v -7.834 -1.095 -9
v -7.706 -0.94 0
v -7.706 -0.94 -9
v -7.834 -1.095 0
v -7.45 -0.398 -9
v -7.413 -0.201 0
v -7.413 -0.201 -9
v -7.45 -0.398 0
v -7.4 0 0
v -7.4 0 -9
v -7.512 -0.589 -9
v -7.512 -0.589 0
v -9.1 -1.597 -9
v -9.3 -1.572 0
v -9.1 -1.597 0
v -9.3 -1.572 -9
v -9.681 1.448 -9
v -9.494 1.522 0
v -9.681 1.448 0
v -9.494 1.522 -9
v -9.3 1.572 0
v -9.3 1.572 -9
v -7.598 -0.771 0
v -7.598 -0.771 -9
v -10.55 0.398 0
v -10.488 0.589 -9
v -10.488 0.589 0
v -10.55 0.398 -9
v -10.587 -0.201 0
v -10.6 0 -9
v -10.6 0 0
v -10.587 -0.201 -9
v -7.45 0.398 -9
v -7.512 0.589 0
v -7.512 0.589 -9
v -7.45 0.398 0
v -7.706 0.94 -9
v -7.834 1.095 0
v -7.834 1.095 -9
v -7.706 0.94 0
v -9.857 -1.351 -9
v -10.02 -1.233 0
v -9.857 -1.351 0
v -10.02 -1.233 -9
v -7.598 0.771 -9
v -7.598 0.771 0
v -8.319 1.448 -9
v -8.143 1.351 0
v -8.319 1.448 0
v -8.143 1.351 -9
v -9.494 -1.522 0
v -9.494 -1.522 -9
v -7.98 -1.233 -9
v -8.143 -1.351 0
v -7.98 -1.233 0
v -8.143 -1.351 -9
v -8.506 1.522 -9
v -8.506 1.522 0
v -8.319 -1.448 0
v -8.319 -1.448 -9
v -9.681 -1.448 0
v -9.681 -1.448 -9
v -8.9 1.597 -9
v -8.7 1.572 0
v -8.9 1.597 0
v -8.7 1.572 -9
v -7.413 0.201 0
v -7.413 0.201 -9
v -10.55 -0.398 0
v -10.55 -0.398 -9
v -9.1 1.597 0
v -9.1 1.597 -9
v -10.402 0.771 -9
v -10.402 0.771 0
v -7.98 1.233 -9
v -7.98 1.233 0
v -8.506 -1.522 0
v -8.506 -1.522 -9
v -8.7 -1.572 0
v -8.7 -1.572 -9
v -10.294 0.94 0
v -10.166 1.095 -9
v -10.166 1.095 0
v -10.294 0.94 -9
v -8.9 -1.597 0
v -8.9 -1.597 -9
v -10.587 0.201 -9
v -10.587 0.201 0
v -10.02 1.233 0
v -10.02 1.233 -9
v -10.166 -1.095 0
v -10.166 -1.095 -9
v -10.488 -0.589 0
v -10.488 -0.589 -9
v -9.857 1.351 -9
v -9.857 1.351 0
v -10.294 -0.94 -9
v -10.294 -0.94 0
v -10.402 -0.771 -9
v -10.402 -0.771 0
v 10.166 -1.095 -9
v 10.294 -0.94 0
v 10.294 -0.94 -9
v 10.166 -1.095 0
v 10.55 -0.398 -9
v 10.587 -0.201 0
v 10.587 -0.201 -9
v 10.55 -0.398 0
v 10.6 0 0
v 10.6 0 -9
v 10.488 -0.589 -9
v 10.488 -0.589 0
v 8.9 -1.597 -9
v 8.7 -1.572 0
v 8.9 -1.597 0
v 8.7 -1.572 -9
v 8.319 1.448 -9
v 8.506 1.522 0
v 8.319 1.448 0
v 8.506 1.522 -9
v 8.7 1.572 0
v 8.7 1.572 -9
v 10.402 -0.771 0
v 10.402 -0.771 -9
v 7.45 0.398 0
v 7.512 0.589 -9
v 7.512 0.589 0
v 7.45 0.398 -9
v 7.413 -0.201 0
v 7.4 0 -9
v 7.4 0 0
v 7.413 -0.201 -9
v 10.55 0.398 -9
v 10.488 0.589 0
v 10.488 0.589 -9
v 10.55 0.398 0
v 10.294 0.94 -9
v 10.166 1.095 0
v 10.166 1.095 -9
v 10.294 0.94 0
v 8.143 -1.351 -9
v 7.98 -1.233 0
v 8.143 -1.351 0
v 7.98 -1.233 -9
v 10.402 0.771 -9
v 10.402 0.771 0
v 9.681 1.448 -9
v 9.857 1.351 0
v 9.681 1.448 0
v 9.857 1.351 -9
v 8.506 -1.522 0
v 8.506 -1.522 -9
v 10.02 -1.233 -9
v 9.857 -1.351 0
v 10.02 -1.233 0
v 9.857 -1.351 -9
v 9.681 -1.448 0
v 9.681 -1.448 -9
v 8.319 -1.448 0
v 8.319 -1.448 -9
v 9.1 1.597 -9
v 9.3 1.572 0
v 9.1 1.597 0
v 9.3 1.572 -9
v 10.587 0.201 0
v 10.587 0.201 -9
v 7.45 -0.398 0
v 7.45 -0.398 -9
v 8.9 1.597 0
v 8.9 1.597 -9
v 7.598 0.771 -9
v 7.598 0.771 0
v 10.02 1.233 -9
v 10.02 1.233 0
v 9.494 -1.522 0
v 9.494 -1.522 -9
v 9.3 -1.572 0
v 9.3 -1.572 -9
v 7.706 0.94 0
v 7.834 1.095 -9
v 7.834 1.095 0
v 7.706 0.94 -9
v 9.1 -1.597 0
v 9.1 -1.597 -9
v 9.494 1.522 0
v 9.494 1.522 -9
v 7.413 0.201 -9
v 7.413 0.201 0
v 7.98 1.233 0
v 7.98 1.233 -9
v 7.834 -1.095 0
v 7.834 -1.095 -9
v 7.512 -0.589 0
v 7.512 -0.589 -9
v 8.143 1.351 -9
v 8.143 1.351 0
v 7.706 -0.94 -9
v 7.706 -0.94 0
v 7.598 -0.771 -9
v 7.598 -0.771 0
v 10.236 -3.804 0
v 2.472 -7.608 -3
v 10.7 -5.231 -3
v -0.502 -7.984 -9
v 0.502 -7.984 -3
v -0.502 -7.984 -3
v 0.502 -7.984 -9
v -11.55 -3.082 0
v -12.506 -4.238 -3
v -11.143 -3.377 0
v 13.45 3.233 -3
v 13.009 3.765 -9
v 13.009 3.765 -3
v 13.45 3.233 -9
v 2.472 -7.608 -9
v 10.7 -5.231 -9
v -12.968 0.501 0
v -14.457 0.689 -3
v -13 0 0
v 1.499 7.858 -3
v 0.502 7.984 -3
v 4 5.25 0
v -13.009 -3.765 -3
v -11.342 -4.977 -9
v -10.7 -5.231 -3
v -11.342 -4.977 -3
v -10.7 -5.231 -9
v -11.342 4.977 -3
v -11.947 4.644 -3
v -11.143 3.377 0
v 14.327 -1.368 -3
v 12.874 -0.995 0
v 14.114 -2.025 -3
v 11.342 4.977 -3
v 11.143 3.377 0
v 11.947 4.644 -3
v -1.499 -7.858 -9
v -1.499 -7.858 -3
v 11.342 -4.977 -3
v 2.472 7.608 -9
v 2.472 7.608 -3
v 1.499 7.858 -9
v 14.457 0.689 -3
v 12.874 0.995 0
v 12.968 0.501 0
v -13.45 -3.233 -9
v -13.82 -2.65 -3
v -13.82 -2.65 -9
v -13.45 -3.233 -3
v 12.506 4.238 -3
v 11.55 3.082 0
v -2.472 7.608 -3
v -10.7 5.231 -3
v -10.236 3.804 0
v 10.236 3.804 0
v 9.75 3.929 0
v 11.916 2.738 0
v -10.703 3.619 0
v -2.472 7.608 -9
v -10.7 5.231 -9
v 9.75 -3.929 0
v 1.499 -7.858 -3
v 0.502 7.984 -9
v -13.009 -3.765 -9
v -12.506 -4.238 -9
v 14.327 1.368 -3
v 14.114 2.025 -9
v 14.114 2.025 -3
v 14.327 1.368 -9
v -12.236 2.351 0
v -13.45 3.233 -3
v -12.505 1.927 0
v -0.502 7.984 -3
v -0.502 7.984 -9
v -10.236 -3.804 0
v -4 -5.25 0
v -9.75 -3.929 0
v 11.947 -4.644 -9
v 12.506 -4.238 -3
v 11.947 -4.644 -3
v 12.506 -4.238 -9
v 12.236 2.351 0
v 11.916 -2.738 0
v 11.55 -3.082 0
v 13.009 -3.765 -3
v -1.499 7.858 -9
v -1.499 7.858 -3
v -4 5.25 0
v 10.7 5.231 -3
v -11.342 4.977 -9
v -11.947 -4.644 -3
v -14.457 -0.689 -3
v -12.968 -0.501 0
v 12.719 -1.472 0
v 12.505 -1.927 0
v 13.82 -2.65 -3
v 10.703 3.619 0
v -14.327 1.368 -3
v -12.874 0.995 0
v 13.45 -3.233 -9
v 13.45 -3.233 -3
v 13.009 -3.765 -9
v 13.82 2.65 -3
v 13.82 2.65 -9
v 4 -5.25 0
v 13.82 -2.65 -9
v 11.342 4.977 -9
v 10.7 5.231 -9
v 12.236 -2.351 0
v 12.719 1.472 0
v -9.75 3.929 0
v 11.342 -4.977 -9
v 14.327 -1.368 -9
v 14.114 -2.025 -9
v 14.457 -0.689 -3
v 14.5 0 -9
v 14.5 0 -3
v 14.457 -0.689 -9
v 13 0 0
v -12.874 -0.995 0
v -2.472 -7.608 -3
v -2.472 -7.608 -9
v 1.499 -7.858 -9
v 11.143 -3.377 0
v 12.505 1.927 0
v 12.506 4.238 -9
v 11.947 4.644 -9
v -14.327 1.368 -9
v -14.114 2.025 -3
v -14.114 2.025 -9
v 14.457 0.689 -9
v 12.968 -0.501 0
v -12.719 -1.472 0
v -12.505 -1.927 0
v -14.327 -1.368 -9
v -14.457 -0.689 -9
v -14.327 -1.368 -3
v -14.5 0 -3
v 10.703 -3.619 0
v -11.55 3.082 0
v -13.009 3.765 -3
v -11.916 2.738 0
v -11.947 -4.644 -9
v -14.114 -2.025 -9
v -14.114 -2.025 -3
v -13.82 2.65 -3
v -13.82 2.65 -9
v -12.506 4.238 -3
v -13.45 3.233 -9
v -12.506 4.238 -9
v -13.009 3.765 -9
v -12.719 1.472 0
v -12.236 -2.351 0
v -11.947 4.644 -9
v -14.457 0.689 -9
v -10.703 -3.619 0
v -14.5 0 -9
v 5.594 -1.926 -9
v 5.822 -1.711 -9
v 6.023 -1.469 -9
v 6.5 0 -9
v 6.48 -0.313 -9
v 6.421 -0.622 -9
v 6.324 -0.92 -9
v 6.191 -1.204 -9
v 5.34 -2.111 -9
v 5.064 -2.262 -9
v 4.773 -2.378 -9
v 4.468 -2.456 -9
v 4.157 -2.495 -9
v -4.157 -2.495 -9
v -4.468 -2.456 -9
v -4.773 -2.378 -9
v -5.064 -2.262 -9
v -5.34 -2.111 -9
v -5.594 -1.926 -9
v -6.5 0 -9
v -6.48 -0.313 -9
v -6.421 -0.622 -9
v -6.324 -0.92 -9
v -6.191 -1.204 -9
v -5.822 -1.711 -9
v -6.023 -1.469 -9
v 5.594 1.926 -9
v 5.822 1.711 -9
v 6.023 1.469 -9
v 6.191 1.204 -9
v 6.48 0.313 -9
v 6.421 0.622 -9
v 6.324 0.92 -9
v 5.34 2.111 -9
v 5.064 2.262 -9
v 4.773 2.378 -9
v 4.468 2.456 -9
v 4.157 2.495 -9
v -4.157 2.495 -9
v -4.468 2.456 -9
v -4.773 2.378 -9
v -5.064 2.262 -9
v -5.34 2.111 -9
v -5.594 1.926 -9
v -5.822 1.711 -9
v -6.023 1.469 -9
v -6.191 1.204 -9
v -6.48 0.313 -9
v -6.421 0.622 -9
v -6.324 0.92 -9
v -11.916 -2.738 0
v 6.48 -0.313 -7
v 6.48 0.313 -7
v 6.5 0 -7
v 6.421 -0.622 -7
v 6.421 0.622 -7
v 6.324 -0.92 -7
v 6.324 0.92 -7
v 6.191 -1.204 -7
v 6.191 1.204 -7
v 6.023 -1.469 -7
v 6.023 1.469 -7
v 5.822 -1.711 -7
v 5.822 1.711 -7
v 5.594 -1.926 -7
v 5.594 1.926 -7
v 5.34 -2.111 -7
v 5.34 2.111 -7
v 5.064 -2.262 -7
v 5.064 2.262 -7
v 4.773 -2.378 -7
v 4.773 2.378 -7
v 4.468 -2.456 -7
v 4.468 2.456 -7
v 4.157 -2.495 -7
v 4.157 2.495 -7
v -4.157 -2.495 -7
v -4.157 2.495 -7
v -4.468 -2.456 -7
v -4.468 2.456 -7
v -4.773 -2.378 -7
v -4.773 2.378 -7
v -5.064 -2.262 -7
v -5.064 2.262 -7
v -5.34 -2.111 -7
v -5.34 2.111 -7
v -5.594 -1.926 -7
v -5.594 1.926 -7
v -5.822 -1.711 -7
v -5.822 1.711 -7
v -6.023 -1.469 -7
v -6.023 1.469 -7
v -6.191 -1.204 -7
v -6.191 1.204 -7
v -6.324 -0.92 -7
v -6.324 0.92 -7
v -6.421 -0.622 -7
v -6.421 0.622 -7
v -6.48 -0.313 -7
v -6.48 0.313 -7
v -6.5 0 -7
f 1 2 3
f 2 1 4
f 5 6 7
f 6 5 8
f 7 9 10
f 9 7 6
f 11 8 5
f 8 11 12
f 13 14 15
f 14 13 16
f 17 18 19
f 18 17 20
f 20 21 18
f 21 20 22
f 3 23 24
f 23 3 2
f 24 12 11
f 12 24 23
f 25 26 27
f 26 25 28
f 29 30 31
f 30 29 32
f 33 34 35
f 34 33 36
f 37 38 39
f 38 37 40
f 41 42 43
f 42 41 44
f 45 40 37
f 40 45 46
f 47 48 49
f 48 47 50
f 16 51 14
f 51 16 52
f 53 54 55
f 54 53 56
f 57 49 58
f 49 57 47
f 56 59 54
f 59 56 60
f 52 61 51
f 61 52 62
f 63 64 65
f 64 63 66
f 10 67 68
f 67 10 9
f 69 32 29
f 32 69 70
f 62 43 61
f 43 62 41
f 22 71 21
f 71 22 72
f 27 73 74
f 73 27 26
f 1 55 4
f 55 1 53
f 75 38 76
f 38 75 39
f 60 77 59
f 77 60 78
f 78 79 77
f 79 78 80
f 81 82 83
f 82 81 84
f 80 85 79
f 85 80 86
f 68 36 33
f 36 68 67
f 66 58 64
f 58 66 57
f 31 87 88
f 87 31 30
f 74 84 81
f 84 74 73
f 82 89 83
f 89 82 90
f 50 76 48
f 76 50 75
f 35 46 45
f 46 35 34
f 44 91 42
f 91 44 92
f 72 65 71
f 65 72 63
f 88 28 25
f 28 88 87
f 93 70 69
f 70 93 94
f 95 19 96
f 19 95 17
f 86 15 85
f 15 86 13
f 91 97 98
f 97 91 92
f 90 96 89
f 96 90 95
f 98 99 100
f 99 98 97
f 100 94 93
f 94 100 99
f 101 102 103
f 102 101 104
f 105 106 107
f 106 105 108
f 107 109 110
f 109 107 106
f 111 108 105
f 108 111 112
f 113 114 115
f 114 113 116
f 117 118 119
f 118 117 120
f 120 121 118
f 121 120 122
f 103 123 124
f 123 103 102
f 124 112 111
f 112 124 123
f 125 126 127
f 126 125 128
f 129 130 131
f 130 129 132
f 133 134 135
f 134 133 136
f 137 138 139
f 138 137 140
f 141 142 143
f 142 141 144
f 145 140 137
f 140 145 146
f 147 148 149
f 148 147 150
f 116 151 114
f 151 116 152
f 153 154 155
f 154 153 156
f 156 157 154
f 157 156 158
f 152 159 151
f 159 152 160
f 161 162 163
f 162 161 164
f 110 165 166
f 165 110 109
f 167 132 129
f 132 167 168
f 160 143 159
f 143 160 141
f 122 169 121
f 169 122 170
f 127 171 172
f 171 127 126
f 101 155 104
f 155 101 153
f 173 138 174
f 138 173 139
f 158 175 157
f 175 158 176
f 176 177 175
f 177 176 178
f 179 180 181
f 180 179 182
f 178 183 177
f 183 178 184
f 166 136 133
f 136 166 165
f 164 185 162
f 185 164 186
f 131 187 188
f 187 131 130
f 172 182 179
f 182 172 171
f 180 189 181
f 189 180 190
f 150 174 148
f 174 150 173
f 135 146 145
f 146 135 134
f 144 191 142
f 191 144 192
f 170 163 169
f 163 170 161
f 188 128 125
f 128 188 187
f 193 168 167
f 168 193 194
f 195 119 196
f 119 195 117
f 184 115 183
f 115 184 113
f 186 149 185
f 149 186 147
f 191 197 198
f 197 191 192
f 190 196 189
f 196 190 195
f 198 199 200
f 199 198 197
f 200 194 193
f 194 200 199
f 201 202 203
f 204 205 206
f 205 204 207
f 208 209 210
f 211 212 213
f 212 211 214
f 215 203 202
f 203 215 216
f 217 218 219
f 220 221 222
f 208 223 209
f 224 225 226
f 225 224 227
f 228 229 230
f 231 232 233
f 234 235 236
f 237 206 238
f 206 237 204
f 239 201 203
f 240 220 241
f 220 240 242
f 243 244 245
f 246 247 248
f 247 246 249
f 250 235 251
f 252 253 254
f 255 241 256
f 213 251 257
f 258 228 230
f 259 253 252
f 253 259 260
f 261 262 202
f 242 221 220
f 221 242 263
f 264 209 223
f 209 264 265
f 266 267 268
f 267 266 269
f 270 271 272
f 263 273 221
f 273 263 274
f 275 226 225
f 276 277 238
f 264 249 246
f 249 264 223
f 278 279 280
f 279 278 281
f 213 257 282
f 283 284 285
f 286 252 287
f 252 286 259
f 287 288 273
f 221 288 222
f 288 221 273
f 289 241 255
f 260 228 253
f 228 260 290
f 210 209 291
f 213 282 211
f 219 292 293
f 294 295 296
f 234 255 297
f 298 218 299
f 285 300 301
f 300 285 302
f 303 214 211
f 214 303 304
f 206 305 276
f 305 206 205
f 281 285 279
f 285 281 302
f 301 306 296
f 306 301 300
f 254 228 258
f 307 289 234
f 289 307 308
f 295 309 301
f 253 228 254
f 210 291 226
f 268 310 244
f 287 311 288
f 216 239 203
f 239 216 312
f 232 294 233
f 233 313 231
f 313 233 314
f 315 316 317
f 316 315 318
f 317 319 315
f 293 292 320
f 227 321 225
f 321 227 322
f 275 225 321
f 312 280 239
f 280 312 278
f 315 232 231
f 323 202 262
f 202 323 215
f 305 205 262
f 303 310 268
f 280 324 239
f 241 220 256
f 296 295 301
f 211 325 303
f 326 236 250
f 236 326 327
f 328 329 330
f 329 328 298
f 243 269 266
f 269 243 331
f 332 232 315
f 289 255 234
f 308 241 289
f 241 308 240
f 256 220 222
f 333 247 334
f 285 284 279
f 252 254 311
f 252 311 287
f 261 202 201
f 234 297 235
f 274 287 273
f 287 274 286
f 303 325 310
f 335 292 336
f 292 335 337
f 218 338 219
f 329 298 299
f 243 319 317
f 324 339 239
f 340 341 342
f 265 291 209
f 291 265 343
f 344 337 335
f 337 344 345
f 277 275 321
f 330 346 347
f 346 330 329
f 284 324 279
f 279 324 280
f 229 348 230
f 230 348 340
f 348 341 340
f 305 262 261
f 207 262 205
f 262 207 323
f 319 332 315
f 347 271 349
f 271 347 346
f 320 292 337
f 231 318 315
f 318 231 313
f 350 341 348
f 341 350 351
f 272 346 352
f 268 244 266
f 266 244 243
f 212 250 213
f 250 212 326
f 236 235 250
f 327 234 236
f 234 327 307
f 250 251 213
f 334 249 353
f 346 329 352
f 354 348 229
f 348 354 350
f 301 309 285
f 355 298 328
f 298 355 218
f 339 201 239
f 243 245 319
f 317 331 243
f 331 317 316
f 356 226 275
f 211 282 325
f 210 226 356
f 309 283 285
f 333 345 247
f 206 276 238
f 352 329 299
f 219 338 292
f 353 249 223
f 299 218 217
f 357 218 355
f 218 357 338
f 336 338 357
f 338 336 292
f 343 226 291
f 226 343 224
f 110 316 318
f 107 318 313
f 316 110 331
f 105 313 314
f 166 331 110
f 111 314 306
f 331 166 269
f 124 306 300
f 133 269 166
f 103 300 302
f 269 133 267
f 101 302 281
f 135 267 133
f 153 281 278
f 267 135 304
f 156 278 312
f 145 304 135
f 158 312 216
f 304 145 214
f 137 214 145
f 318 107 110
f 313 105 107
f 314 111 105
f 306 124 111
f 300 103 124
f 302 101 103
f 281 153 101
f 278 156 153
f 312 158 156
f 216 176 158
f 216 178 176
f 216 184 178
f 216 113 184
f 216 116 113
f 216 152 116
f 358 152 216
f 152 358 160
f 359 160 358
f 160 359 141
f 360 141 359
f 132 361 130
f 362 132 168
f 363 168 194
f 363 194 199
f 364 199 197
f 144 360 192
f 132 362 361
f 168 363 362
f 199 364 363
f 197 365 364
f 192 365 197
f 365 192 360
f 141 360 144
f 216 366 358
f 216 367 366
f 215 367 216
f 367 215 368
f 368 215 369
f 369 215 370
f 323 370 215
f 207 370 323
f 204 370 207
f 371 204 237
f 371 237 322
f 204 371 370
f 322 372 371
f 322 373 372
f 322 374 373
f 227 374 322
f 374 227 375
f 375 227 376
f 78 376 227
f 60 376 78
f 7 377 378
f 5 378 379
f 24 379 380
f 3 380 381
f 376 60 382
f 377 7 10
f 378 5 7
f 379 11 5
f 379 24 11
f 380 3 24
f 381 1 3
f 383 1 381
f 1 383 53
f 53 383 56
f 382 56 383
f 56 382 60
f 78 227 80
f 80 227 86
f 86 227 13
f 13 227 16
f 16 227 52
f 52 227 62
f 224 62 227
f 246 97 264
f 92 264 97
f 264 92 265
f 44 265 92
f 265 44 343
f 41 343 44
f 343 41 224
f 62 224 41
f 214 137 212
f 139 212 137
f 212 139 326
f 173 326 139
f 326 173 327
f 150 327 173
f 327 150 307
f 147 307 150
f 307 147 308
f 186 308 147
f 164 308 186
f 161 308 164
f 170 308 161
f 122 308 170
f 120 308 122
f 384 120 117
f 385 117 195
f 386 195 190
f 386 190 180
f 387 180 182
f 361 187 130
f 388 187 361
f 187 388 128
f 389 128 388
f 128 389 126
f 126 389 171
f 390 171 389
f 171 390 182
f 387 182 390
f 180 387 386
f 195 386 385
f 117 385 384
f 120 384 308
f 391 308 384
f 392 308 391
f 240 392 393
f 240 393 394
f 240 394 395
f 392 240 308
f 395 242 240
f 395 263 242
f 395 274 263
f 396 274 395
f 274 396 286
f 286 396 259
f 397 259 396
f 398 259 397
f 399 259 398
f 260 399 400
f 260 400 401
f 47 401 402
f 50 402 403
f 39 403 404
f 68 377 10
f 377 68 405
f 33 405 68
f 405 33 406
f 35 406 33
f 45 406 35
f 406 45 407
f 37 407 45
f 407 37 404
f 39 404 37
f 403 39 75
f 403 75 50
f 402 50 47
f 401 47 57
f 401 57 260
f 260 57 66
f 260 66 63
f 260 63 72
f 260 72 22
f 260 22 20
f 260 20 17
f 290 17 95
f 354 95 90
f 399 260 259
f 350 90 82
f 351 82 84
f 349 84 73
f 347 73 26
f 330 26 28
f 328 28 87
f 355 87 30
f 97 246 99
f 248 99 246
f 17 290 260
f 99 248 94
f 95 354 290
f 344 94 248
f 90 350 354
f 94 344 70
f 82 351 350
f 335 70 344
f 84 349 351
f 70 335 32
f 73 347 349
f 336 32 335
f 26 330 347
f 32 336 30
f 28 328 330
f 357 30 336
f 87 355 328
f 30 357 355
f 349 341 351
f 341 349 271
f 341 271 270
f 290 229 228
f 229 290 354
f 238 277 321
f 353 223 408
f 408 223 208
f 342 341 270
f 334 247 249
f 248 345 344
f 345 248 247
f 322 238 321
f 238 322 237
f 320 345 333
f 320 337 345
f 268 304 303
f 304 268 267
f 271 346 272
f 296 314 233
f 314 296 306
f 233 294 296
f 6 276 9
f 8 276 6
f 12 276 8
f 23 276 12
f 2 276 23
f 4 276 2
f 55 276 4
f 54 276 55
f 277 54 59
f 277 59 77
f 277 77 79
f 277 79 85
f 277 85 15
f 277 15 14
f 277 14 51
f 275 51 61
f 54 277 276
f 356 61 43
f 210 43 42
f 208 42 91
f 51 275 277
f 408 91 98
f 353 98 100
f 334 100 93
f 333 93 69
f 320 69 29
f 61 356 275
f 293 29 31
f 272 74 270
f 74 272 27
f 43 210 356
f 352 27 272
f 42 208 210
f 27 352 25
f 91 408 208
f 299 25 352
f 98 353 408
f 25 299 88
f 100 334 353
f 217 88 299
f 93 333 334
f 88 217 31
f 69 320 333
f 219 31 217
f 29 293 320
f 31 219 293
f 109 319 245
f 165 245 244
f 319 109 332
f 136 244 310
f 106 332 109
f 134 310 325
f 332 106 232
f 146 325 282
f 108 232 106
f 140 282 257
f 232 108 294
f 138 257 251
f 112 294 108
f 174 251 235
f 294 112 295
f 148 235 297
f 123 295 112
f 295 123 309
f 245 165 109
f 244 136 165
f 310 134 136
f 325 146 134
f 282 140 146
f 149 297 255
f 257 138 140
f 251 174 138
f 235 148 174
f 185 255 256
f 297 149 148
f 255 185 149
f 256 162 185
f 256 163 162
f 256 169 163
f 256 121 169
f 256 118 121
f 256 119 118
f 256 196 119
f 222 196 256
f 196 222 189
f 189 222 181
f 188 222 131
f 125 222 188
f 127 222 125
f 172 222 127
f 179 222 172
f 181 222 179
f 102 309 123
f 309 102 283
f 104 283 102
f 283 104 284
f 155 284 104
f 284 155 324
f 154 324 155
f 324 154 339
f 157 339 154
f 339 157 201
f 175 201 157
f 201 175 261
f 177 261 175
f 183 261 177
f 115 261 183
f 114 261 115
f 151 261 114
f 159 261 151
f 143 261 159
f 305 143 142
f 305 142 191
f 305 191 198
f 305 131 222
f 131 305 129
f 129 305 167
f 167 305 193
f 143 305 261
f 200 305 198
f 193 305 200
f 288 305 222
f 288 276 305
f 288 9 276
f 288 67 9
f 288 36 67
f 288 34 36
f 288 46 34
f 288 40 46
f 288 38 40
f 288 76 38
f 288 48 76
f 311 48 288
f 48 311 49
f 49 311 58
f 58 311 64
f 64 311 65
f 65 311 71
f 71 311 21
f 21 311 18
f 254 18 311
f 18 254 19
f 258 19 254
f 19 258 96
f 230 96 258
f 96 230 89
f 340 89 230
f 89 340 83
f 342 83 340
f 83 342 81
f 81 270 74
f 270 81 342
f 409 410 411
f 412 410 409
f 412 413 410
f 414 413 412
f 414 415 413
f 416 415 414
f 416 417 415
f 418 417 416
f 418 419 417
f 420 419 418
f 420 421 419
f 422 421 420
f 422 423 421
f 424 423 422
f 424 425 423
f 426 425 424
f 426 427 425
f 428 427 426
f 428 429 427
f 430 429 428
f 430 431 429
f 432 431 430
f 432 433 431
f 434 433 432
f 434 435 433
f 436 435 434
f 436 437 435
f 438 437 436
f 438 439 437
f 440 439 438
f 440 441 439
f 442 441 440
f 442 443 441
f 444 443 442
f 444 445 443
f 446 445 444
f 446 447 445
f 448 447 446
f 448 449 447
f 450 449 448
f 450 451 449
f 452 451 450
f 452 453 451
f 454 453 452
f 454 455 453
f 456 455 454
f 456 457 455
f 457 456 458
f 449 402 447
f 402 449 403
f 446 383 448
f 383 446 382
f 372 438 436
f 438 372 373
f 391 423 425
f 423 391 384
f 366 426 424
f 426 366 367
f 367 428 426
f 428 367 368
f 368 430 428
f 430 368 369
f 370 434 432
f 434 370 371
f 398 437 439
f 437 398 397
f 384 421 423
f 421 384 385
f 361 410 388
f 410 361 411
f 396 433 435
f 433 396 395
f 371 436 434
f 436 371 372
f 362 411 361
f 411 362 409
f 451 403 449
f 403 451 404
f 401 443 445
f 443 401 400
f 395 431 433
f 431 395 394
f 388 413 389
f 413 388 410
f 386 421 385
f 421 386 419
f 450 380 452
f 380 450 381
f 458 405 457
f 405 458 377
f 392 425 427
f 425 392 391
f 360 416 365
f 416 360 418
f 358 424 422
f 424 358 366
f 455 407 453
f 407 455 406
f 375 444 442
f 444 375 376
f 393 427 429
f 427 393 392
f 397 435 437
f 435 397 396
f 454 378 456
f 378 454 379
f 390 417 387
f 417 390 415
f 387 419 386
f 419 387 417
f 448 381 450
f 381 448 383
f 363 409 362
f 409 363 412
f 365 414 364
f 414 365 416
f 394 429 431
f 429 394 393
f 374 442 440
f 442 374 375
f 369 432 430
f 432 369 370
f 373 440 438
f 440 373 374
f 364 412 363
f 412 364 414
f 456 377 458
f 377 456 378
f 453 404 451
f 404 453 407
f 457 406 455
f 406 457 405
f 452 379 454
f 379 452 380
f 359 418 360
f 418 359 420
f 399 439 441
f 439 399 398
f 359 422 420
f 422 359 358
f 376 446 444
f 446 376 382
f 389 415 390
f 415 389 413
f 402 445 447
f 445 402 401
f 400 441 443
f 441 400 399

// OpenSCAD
$fn=50;
h_nut = 2.7;


module plate(height, d, l) {
    linear_extrude(height) {
        hull() {
            square([d,l], center=true);
            for(x=[-18/2, 18/2]) {
                translate([x,0,0]) circle(d=d);
            }
        }
    }
}

module base(h) {
    difference() {
        hull() {
            plate(h, 8, 10.5);
            union() {
                translate([0,0,h-6]) cylinder(d=16, h=6);
                for(x=[-18/2, 18/2]) {
                    translate([x,0,h-6]) cylinder(d=11, h=6);
                }
            }
        }
        for(x=[-18/2, 18/2]) {
            translate([x,0,-1])
                cylinder(d=3.2, h=h+2);
        }
        hull() for(x=[-4, 4]) {
            translate([x,0,h-2])
                cylinder(d=5, h=2+0.01);
        }
    }
}

module top(z) {
    translate([0,0,z]) difference() {
        plate(1.9+3.2, 11, 16);
        translate([0,0,1.9-0.01]) cylinder(d=12.7, h=3.2+0.02);
        translate([0,0,-1]) cylinder(d=13.7, h=1.9+1);
        for(x=[-18/2, 18/2]) {
            translate([x,0,-1]) cylinder(d=3.2, h=5);
            translate([x,0,1.9+3.2-2]) cylinder(d1=3.2, d2=5.5, h=2+0.01);
        }
    }
}

module bracket() {
    h = 16;
    difference() {
        translate([-15,0,0]) cube([30,16,h]);
        union() {
            for(x=[-10,10]) {
                translate([x,-1,h/2]) {                    
                    rotate([-90,0,0]) cylinder(d=3.2, h=h+2);
                    rotate([-90,0,0]) cylinder(d=7.1, h=4+1);
                }
            }
            translate([0,16/2,-1]) cylinder(d=12.7, h=h);
            translate([0,16/2,1.2]) cylinder(d=13.7, h=h);
        }
    }
}

//base(h=9);
//top(z=9.1);

rotate([180,0,0]) base(h=9);
//rotate([180,0,0]) top(z=0);
//bracket();
